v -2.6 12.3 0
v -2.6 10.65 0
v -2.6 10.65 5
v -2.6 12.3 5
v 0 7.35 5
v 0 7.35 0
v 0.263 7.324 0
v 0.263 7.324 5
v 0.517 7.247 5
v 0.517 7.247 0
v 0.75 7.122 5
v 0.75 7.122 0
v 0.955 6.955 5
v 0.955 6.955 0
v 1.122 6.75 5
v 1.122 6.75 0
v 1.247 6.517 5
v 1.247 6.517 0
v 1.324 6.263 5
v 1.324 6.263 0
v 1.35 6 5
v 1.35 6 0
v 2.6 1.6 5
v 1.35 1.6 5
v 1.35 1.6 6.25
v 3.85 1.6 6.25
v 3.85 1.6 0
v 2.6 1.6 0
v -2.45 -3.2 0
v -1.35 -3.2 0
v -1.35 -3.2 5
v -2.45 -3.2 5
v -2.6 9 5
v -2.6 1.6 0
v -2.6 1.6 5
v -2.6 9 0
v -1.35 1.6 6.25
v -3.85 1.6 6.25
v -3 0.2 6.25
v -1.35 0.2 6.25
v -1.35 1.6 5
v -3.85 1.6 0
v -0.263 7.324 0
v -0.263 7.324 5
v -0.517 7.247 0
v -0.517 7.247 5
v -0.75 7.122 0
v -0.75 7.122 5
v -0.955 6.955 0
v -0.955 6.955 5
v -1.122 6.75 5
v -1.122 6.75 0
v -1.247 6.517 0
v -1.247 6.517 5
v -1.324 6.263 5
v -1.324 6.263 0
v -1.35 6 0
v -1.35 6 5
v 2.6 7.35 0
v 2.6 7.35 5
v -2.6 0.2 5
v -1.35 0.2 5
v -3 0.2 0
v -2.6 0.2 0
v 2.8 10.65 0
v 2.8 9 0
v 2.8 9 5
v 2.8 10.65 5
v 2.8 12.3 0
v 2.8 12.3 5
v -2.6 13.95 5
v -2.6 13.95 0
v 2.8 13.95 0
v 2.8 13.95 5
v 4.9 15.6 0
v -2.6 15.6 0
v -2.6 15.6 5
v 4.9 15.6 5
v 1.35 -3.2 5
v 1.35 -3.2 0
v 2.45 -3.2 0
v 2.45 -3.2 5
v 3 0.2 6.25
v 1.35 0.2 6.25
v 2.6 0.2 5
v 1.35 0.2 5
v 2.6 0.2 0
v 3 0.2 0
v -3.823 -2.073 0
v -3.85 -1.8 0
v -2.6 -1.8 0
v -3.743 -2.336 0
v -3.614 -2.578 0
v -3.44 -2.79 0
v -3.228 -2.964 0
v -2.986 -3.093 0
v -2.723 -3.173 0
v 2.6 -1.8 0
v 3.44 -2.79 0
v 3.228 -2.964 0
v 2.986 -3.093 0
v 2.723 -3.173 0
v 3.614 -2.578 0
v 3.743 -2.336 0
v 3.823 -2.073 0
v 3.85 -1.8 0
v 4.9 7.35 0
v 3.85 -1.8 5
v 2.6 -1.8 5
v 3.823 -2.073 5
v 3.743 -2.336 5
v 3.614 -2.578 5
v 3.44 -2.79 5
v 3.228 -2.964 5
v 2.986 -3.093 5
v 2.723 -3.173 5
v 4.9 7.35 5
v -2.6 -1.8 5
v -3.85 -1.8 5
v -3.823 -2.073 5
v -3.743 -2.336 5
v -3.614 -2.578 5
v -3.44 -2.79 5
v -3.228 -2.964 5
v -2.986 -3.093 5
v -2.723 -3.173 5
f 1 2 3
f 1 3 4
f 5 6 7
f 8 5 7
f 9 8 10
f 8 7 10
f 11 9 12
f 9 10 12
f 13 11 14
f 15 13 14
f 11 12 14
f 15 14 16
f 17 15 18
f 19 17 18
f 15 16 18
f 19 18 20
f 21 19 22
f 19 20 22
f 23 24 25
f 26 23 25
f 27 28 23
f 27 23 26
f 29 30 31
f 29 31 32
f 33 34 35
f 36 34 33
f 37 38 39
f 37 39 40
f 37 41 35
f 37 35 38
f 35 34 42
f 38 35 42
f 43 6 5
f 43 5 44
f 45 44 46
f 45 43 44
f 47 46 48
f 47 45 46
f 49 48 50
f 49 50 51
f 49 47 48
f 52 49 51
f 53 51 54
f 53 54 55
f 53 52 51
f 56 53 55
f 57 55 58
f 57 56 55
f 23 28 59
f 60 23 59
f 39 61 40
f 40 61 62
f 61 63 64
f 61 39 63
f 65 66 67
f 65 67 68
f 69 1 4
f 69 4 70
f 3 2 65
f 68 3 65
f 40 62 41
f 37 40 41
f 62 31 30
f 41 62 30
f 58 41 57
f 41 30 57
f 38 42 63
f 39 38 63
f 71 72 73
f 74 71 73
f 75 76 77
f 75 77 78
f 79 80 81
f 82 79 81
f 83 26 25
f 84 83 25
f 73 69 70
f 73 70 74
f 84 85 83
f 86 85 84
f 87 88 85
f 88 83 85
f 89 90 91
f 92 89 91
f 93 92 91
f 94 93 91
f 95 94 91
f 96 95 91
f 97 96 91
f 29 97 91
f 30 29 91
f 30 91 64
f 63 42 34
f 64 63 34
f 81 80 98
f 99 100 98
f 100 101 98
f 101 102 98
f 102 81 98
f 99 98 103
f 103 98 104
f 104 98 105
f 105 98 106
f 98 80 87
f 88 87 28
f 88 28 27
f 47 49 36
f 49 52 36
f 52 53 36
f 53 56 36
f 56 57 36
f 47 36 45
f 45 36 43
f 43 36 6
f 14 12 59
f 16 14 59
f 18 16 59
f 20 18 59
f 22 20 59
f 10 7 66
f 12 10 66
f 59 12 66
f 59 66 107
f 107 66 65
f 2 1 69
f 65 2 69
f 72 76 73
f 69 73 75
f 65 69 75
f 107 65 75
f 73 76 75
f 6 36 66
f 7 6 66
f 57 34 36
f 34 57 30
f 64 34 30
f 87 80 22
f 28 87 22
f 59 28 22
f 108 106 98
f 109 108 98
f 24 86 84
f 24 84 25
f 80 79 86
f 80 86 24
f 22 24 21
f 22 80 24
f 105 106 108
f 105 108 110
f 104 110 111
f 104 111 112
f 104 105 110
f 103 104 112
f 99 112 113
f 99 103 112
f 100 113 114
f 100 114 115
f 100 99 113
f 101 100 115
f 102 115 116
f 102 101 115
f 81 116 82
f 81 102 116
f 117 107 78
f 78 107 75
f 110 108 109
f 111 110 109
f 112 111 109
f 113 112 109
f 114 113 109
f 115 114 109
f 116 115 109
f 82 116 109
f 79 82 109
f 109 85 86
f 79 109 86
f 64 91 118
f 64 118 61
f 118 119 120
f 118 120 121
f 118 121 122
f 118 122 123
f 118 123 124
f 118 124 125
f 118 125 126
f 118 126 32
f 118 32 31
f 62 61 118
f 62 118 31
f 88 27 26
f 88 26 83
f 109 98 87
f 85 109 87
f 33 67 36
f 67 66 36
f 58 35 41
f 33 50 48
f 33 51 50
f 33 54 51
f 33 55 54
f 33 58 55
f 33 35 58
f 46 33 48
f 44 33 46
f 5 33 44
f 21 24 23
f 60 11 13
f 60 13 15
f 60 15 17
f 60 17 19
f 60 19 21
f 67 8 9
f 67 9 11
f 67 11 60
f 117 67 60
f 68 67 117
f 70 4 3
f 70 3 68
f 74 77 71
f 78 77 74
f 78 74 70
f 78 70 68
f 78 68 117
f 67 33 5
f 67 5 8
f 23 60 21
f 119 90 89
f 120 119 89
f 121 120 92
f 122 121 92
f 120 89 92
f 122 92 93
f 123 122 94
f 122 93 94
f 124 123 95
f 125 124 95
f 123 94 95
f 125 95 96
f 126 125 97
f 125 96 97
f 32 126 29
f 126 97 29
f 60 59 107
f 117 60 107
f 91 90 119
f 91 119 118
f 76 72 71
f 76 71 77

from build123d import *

# Parameters (mm, degrees)
PAD017_DEPTH           = 5
PAD020_DEPTH           = 6.25
SKETCH112_W            = 7.5
SKETCH112_H            = 1.65
PAD082_DEPTH           = 5
SKETCH113_W            = 2.1
SKETCH113_H            = 1.65
PAD083_DEPTH           = 5
SKETCH111_W            = 7.5
SKETCH111_H            = 1.65
PAD084_DEPTH           = 5
LINEARPATTERN026_COUNT = 2
LINEARPATTERN026_PITCH = 3.3


with BuildPart() as bc_c:
    # Sketch034 → Pad017 (new body)
    with BuildSketch(Plane.XY):
        with BuildLine():
            Line((-1.35, -1.8), (-1.35, 6))
            ThreePointArc((0, 7.35), (-0.954594, 6.954594), (-1.35, 6))
            Line((0, 9), (0, 7.35))
            Line((-2.6, 9), (0, 9))
            Line((-2.6, -1.8), (-2.6, 9))
            Line((-3.85, -1.8), (-2.6, -1.8))
            ThreePointArc((-3.85, -1.8), (-3.439949, -2.789949), (-2.45, -3.2))
            Line((-1.35, -3.2), (-2.45, -3.2))
            Line((-1.35, -1.8), (-1.35, -3.2))
        make_face()
    extrude(amount=PAD017_DEPTH)

    # Sketch037 → Pad020 (join)
    with BuildSketch(Plane.XY):
        Polygon((-1.35, 0.2), (-1.35, 1.6), (-2.6, 1.6), (-3.85, 1.6), (-3, 0.2), (-2.6, 0.2), align=None)
    extrude(amount=PAD020_DEPTH)


with BuildPart() as bc_s_mirrored:
    # Mirror001: instance of _bc_c
    add(bc_c.part.mirror(Plane(origin=(0, 0, 0), x_dir=(0, 1, 0), z_dir=(-1, 0, 0))))


with BuildPart() as body042:
    # Fusion001 base: copy of _bc_c
    add(bc_c.part)

    # Fusion001: union _bc_s(mirrored)
    add(bc_s_mirrored.part)

    # Sketch112 → Pad082 (new body)
    with BuildSketch(Plane.XY):
        with Locations((1.15, 8.175)):
            Rectangle(SKETCH112_W, SKETCH112_H)
    pad082 = extrude(amount=PAD082_DEPTH)

    # Sketch113 → Pad083 (join)
    with BuildSketch(Plane.XY):
        with Locations((3.85, 9.825)):
            Rectangle(SKETCH113_W, SKETCH113_H)
    pad083 = extrude(amount=PAD083_DEPTH)

    # Sketch111 → Pad084 (join)
    with BuildSketch(Plane.XY):
        with Locations((1.15, 11.475)):
            Rectangle(SKETCH111_W, SKETCH111_H)
    pad084 = extrude(amount=PAD084_DEPTH)

    # LinearPattern026: Pad083, Pad082, Pad084 ×2
    with Locations(*[(0, i * LINEARPATTERN026_PITCH, 0) for i in range(1, LINEARPATTERN026_COUNT)]):
        add(pad083)
        add(pad082)
        add(pad084)


solid = body042.part
